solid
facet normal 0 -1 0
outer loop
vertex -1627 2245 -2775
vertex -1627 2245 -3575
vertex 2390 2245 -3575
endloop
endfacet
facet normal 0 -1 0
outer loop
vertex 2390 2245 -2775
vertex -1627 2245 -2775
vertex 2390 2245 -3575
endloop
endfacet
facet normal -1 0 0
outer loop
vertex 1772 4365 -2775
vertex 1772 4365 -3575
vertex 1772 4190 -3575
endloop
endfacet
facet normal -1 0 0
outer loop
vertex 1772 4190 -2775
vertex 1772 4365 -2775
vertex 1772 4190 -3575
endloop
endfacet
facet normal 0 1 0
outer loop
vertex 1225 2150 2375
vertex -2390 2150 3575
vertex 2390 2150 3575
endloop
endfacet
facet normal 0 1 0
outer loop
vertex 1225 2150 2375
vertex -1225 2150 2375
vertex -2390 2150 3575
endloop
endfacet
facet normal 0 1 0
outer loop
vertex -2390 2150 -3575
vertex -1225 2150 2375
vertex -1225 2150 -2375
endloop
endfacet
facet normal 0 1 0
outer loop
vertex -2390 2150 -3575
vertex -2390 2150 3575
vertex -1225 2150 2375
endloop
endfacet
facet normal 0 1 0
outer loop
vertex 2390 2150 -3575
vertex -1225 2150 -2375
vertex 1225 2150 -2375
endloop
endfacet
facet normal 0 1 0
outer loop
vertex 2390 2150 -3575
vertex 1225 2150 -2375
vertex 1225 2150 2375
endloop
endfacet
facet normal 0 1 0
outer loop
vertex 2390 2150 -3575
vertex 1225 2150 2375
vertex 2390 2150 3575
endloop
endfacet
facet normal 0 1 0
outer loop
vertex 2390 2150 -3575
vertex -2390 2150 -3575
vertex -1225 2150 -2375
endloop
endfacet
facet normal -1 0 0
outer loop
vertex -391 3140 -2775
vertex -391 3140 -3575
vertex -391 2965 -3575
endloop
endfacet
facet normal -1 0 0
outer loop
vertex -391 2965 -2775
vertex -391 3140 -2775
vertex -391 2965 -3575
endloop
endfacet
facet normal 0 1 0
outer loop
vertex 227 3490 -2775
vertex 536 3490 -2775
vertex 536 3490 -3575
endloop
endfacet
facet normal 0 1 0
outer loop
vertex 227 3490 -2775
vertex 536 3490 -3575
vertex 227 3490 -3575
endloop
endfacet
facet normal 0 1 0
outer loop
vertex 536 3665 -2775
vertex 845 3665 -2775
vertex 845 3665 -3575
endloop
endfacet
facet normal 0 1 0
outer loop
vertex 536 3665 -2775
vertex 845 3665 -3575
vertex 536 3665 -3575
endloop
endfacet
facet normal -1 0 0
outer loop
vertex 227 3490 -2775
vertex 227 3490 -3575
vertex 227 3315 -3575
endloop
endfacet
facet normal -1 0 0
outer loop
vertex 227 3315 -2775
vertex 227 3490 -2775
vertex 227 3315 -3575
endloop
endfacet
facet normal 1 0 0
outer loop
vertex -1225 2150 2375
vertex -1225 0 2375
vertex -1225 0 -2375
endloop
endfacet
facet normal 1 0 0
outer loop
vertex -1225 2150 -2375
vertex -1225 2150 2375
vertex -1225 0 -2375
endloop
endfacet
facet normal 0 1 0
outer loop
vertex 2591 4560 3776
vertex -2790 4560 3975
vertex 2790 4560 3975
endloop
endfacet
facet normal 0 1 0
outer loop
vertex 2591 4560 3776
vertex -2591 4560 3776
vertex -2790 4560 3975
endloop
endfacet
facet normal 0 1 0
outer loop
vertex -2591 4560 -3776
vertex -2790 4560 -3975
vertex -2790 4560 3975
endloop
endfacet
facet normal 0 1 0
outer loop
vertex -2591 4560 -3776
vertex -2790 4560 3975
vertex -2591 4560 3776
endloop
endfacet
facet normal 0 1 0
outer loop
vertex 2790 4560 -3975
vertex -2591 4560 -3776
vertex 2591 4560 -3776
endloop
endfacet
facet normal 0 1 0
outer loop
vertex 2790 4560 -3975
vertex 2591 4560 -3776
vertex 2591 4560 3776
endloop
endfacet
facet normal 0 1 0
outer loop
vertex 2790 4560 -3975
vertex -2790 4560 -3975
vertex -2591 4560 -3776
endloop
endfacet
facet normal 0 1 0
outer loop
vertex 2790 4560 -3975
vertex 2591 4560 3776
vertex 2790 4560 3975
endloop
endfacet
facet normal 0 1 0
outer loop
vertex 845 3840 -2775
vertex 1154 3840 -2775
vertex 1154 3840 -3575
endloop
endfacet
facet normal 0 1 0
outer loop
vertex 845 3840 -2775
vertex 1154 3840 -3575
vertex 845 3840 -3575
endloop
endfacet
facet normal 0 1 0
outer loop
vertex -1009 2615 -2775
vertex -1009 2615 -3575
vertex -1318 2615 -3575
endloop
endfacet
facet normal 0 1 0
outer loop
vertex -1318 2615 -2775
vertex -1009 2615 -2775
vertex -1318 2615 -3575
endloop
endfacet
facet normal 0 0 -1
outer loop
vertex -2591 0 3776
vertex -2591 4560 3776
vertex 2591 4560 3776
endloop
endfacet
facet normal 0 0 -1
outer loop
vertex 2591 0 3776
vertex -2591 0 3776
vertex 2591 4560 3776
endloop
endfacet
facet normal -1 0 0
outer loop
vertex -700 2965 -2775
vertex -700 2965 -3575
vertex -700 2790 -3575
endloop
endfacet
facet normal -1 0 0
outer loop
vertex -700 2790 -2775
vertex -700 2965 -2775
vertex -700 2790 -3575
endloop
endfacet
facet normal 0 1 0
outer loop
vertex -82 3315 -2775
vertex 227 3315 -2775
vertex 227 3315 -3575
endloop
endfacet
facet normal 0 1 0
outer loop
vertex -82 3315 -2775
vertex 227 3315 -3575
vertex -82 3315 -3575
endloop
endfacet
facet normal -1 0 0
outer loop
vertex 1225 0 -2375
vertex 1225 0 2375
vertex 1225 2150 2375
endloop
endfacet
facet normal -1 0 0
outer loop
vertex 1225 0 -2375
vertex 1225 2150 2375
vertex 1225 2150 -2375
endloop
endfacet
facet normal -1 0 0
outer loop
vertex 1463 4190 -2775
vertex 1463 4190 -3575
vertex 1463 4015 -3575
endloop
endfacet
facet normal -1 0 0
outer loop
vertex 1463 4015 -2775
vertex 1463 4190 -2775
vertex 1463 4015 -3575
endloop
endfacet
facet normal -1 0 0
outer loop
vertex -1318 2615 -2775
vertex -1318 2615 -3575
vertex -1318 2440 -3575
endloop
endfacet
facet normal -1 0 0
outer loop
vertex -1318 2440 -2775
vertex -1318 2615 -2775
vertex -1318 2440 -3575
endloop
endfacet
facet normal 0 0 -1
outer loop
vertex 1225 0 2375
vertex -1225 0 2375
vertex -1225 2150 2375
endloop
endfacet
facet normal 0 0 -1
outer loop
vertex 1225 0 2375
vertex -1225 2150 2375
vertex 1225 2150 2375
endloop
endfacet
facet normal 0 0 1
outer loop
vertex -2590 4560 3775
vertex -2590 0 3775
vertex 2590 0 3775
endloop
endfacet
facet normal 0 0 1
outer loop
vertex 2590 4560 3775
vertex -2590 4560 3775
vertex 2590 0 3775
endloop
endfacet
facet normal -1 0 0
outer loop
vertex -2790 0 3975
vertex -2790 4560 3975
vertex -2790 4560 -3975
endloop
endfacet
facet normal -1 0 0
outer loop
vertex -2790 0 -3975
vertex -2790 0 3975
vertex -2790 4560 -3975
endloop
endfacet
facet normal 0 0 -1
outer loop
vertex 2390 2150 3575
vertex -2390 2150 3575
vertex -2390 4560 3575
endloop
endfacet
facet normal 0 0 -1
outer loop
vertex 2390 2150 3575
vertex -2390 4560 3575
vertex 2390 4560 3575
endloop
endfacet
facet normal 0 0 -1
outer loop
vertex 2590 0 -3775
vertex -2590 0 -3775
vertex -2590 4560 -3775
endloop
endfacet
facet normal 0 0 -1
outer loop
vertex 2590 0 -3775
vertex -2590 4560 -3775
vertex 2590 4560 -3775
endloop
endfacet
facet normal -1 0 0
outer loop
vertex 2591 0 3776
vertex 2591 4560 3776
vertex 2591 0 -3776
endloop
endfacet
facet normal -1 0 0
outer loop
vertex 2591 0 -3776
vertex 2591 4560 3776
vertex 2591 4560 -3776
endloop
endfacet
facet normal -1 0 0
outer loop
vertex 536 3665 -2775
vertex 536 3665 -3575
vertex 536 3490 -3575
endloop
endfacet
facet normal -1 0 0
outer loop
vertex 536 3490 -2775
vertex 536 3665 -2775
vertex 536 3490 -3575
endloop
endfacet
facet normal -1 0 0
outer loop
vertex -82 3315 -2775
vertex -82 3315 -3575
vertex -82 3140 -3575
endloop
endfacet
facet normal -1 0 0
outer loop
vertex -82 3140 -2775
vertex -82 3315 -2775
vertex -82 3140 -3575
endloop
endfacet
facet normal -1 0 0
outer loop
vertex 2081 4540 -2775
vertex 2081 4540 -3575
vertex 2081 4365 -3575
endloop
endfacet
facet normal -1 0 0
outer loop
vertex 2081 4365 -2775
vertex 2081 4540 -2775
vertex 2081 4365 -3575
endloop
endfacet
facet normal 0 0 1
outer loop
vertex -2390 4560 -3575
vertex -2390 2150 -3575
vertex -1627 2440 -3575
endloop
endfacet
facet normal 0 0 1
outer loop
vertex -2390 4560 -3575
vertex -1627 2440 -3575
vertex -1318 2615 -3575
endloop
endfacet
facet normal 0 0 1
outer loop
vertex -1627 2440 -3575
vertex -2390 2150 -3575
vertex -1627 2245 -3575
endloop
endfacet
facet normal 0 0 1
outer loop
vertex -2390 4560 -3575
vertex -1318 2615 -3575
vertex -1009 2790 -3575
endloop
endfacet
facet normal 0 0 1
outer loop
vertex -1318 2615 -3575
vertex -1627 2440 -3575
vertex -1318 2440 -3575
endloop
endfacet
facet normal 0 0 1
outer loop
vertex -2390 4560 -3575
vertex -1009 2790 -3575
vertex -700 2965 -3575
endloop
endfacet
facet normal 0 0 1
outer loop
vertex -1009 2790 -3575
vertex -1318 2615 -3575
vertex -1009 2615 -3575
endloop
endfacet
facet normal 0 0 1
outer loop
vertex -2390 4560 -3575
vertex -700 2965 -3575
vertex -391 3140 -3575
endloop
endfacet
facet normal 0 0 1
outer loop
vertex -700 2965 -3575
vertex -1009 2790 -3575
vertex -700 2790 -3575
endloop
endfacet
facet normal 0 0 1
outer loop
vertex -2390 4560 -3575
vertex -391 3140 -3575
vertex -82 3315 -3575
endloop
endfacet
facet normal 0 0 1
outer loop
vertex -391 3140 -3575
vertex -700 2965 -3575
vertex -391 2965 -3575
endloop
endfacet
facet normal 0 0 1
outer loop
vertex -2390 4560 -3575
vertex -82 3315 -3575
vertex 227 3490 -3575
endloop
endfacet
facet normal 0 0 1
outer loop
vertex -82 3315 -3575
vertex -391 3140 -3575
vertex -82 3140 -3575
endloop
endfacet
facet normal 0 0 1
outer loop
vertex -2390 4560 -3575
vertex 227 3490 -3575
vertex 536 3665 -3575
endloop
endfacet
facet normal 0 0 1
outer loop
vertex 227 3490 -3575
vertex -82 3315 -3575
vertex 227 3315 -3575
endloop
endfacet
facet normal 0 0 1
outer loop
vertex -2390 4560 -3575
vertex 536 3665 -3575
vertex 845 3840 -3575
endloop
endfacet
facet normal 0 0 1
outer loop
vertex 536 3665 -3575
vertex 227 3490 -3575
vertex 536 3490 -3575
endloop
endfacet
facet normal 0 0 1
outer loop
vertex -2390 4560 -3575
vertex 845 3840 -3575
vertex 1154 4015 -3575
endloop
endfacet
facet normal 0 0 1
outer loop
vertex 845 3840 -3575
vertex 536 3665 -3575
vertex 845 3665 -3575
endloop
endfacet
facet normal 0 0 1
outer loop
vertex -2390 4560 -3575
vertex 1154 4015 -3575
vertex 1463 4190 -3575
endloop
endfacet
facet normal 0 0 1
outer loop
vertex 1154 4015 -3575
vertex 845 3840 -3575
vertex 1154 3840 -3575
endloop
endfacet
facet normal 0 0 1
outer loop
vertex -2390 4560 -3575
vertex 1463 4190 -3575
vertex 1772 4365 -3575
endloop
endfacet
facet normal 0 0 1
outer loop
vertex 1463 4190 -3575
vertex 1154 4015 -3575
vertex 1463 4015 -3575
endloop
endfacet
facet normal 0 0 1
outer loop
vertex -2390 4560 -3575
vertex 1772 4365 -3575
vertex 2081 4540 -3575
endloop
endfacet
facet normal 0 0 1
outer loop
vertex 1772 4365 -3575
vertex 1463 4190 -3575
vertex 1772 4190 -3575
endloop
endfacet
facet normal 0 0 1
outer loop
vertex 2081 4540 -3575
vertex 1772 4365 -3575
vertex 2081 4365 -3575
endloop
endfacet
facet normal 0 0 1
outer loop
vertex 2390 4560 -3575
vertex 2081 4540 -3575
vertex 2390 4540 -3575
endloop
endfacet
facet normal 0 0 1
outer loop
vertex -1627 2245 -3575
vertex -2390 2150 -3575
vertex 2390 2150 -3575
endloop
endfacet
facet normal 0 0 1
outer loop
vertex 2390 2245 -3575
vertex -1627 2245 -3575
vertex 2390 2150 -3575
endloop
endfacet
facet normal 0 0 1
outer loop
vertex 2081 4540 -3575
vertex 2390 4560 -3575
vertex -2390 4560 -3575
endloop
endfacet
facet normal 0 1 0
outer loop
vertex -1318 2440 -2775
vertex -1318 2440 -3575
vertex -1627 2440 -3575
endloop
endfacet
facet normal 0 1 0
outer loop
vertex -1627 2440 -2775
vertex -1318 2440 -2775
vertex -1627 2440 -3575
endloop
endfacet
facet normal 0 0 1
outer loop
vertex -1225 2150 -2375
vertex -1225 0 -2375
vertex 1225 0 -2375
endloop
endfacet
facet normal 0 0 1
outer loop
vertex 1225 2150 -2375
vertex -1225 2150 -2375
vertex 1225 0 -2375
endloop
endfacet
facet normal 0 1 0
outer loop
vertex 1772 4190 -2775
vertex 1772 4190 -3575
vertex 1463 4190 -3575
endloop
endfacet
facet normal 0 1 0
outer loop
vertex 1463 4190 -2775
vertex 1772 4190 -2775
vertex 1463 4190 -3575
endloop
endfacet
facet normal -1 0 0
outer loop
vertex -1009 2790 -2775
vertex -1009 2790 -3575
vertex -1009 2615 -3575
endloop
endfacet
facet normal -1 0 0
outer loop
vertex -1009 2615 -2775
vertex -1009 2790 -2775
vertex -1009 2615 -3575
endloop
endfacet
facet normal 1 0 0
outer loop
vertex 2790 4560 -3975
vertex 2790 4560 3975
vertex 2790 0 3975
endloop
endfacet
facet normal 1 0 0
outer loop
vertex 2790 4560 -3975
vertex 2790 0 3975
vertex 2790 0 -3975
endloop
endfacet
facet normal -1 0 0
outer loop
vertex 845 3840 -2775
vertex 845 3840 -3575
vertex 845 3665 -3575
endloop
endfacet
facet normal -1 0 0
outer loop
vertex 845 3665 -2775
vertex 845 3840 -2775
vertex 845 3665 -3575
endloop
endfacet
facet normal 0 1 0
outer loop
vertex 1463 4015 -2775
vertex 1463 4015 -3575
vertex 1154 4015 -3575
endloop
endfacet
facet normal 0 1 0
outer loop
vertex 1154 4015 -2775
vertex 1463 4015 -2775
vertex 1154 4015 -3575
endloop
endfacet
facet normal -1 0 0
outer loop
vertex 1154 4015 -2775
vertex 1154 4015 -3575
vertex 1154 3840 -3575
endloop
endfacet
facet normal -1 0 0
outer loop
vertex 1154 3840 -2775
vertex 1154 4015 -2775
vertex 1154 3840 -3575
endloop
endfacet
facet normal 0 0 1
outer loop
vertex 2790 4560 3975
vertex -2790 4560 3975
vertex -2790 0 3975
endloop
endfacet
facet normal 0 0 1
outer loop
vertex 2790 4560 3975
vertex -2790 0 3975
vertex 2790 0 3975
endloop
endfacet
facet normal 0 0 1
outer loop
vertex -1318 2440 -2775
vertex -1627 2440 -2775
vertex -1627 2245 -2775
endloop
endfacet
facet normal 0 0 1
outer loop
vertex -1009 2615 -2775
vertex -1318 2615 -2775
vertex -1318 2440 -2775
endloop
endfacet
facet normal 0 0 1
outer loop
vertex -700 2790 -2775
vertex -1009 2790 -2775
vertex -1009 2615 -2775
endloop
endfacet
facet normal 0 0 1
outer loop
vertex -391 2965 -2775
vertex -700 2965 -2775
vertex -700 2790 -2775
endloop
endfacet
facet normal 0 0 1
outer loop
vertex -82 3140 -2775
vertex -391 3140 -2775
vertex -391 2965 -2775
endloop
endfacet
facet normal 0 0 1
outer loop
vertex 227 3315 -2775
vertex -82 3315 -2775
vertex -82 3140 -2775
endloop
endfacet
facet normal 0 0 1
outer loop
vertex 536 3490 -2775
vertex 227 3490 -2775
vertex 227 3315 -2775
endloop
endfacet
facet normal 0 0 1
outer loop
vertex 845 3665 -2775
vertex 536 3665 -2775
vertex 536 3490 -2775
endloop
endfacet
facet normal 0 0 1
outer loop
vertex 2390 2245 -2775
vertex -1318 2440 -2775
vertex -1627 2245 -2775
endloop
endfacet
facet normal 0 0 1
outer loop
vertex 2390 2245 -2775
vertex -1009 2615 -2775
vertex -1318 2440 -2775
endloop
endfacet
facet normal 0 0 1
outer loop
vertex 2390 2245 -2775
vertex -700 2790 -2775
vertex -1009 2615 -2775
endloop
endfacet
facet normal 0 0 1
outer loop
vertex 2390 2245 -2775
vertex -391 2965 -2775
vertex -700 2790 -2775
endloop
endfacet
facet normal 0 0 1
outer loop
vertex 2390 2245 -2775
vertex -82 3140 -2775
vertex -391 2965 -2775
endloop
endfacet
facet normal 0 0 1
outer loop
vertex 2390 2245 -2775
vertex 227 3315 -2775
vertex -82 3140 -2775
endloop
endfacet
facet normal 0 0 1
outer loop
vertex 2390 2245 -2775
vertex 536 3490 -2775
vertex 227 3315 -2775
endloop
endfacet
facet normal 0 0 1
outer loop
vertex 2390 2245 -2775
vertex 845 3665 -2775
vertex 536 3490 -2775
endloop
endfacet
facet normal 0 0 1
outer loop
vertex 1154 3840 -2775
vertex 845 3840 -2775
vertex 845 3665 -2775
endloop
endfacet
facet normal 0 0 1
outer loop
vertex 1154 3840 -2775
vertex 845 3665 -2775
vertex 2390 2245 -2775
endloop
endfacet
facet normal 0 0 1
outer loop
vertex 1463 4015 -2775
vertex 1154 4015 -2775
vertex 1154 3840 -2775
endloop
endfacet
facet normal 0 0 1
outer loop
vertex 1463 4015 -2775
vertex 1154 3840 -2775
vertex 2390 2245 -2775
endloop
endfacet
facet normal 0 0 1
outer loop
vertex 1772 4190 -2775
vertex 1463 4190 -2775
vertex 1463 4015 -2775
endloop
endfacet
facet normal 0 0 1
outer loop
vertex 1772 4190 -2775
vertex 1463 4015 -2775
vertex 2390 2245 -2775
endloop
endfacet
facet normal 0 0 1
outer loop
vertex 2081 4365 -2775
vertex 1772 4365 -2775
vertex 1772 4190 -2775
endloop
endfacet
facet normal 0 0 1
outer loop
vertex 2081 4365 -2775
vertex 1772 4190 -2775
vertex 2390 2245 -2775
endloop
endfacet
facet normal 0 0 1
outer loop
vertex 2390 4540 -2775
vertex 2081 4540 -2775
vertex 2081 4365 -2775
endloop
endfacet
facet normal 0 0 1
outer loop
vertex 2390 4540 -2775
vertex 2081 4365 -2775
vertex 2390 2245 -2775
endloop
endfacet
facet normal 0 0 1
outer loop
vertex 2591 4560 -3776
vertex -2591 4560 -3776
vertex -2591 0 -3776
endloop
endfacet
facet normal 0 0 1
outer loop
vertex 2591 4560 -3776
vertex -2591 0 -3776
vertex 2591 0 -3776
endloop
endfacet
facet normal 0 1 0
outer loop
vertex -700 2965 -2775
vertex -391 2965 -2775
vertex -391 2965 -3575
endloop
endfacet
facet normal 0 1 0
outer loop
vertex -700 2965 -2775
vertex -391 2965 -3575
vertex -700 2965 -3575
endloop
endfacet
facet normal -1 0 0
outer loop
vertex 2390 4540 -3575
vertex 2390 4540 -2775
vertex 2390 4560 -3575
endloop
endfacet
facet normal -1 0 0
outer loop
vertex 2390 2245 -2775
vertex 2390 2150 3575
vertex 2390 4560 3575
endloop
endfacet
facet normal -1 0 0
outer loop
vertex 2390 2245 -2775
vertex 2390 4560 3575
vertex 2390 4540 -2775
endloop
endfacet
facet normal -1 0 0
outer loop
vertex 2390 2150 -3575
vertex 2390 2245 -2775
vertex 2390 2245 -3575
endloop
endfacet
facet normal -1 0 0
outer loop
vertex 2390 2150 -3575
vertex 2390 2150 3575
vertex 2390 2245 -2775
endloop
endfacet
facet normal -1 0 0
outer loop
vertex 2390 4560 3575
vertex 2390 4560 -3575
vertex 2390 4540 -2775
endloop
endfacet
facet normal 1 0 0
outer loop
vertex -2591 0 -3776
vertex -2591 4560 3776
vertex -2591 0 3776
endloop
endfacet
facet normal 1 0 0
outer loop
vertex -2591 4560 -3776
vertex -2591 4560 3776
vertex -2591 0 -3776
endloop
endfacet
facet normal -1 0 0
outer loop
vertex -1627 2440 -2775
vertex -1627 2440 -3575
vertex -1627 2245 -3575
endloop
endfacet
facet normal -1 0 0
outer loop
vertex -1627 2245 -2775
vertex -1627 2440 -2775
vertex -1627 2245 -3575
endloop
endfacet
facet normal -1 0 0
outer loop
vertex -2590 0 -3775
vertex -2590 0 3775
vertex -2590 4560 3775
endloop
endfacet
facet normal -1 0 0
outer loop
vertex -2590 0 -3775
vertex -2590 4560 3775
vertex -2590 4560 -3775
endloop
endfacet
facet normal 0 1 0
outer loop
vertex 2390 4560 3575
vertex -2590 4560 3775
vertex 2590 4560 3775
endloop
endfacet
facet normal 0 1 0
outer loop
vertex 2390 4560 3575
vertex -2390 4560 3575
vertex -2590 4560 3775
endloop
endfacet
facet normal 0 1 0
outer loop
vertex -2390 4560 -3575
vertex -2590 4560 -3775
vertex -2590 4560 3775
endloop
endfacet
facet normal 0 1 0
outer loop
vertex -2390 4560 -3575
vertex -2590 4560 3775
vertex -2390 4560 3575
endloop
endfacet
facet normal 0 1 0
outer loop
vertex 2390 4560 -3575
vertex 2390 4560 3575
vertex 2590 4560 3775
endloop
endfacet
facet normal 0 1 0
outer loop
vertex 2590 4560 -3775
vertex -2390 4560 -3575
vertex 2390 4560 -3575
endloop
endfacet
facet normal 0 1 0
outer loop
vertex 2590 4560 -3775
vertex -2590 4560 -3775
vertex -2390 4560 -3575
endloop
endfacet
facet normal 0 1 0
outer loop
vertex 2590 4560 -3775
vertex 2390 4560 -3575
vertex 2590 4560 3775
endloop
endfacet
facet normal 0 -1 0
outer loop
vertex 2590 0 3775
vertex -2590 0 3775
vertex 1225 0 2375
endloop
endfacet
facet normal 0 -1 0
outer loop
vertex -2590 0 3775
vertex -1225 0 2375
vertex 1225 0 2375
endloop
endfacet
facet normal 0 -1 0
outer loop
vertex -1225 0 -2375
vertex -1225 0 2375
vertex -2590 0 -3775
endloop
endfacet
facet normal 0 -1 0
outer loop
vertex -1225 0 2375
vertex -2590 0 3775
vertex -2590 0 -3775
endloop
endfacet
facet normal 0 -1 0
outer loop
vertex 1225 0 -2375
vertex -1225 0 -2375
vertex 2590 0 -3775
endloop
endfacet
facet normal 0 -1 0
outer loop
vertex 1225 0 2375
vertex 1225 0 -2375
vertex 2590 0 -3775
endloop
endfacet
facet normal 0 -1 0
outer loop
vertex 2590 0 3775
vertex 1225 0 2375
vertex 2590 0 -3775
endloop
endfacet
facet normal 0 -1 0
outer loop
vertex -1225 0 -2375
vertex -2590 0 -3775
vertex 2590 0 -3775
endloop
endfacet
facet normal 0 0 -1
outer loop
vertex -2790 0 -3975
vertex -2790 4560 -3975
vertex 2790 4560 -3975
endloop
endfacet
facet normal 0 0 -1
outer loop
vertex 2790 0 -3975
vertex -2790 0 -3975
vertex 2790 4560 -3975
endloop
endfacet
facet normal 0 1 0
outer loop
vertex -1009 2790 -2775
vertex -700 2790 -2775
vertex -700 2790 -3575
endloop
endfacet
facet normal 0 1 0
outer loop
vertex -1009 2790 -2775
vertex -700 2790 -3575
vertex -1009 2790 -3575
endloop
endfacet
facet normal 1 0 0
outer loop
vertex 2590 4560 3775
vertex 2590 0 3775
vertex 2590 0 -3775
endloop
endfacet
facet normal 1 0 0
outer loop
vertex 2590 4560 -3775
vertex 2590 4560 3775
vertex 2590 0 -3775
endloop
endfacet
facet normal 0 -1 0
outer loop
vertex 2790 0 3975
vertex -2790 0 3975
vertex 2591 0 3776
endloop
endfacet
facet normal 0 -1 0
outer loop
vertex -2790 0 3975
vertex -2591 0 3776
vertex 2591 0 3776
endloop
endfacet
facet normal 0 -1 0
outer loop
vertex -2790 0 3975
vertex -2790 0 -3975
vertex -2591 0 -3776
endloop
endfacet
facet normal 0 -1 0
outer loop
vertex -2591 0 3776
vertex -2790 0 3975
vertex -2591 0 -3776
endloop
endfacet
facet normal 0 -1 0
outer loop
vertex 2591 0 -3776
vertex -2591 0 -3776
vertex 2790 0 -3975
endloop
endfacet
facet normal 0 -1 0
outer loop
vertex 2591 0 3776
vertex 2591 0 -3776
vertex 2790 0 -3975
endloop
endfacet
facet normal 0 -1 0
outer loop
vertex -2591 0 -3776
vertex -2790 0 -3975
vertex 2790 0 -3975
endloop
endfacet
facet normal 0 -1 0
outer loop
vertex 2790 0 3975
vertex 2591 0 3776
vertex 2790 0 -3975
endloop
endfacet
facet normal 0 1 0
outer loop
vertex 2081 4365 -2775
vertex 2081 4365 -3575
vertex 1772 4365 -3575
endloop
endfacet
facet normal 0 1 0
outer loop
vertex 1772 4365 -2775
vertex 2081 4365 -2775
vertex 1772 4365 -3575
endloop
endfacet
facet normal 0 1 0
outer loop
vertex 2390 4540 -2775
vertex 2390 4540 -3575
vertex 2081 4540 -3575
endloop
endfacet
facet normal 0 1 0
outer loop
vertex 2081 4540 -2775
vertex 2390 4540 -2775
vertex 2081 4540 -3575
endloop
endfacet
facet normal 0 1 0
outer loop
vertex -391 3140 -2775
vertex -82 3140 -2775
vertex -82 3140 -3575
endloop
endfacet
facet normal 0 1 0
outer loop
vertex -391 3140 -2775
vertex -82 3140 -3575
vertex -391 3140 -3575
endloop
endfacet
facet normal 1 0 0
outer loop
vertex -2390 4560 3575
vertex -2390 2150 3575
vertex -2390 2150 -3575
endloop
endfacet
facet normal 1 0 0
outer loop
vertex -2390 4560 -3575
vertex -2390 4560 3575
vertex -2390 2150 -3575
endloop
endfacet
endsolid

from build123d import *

# Parameters (mm, degrees)
CROQUIS1_W              = 5180
CROQUIS1_H              = 7550
CROQUIS1_W_2            = 4780
CROQUIS1_H_2            = 7150
SALIENTE_EXTRUIR1_DEPTH = 4560
SALIENTE_EXTRUIR2_DEPTH = 800
CROQUIS3_W              = 4780
CROQUIS3_H              = 7150
CROQUIS3_W_2            = 2450
CROQUIS3_H_2            = 4750
SALIENTE_EXTRUIR3_DEPTH = 2150
CROQUIS4_W              = 5580
CROQUIS4_H              = 7950
CROQUIS4_W_2            = 5182
CROQUIS4_H_2            = 7552
SALIENTE_EXTRUIR4_DEPTH = 4560


with BuildPart() as part:
    # Croquis1 → Saliente-Extruir1 (new body)
    with BuildSketch(Plane(origin=(0, 0, 0), x_dir=(1, 0, 0), z_dir=(0, 1, 0))):
        Rectangle(CROQUIS1_W, CROQUIS1_H)
        Rectangle(CROQUIS1_W_2, CROQUIS1_H_2, mode=Mode.SUBTRACT)
    extrude(amount=SALIENTE_EXTRUIR1_DEPTH)

    # Croquis2 → Saliente-Extruir2 (add)
    with BuildSketch(Plane.XY.offset(-3575)):
        Polygon((2390, 4540), (2081, 4540), (2081, 4365), (1772, 4365), (1772, 4190), (1463, 4190), (1463, 4015), (1154, 4015), (1154, 3840), (845, 3840), (845, 3665), (536, 3665), (536, 3490), (227, 3490), (227, 3315), (-82, 3315), (-82, 3140), (-391, 3140), (-391, 2965), (-700, 2965), (-700, 2790), (-1009, 2790), (-1009, 2615), (-1318, 2615), (-1318, 2440), (-1627, 2440), (-1627, 2245), (2390, 2245), align=None)
    extrude(amount=SALIENTE_EXTRUIR2_DEPTH)

    # Croquis3 → Saliente-Extruir3 (add)
    with BuildSketch(Plane(origin=(0, 0, 0), x_dir=(1, 0, 0), z_dir=(0, 1, 0))):
        Rectangle(CROQUIS3_W, CROQUIS3_H)
        Rectangle(CROQUIS3_W_2, CROQUIS3_H_2, mode=Mode.SUBTRACT)
    extrude(amount=SALIENTE_EXTRUIR3_DEPTH)


with BuildPart() as body_2:
    # Croquis4 → Saliente-Extruir4 (new body)
    with BuildSketch(Plane(origin=(0, 4560, 0), x_dir=(1, 0, 0), z_dir=(0, 1, 0))):
        Rectangle(CROQUIS4_W, CROQUIS4_H)
        Rectangle(CROQUIS4_W_2, CROQUIS4_H_2, mode=Mode.SUBTRACT)
    extrude(amount=-SALIENTE_EXTRUIR4_DEPTH)


solid = Compound([part.part, body_2.part])
